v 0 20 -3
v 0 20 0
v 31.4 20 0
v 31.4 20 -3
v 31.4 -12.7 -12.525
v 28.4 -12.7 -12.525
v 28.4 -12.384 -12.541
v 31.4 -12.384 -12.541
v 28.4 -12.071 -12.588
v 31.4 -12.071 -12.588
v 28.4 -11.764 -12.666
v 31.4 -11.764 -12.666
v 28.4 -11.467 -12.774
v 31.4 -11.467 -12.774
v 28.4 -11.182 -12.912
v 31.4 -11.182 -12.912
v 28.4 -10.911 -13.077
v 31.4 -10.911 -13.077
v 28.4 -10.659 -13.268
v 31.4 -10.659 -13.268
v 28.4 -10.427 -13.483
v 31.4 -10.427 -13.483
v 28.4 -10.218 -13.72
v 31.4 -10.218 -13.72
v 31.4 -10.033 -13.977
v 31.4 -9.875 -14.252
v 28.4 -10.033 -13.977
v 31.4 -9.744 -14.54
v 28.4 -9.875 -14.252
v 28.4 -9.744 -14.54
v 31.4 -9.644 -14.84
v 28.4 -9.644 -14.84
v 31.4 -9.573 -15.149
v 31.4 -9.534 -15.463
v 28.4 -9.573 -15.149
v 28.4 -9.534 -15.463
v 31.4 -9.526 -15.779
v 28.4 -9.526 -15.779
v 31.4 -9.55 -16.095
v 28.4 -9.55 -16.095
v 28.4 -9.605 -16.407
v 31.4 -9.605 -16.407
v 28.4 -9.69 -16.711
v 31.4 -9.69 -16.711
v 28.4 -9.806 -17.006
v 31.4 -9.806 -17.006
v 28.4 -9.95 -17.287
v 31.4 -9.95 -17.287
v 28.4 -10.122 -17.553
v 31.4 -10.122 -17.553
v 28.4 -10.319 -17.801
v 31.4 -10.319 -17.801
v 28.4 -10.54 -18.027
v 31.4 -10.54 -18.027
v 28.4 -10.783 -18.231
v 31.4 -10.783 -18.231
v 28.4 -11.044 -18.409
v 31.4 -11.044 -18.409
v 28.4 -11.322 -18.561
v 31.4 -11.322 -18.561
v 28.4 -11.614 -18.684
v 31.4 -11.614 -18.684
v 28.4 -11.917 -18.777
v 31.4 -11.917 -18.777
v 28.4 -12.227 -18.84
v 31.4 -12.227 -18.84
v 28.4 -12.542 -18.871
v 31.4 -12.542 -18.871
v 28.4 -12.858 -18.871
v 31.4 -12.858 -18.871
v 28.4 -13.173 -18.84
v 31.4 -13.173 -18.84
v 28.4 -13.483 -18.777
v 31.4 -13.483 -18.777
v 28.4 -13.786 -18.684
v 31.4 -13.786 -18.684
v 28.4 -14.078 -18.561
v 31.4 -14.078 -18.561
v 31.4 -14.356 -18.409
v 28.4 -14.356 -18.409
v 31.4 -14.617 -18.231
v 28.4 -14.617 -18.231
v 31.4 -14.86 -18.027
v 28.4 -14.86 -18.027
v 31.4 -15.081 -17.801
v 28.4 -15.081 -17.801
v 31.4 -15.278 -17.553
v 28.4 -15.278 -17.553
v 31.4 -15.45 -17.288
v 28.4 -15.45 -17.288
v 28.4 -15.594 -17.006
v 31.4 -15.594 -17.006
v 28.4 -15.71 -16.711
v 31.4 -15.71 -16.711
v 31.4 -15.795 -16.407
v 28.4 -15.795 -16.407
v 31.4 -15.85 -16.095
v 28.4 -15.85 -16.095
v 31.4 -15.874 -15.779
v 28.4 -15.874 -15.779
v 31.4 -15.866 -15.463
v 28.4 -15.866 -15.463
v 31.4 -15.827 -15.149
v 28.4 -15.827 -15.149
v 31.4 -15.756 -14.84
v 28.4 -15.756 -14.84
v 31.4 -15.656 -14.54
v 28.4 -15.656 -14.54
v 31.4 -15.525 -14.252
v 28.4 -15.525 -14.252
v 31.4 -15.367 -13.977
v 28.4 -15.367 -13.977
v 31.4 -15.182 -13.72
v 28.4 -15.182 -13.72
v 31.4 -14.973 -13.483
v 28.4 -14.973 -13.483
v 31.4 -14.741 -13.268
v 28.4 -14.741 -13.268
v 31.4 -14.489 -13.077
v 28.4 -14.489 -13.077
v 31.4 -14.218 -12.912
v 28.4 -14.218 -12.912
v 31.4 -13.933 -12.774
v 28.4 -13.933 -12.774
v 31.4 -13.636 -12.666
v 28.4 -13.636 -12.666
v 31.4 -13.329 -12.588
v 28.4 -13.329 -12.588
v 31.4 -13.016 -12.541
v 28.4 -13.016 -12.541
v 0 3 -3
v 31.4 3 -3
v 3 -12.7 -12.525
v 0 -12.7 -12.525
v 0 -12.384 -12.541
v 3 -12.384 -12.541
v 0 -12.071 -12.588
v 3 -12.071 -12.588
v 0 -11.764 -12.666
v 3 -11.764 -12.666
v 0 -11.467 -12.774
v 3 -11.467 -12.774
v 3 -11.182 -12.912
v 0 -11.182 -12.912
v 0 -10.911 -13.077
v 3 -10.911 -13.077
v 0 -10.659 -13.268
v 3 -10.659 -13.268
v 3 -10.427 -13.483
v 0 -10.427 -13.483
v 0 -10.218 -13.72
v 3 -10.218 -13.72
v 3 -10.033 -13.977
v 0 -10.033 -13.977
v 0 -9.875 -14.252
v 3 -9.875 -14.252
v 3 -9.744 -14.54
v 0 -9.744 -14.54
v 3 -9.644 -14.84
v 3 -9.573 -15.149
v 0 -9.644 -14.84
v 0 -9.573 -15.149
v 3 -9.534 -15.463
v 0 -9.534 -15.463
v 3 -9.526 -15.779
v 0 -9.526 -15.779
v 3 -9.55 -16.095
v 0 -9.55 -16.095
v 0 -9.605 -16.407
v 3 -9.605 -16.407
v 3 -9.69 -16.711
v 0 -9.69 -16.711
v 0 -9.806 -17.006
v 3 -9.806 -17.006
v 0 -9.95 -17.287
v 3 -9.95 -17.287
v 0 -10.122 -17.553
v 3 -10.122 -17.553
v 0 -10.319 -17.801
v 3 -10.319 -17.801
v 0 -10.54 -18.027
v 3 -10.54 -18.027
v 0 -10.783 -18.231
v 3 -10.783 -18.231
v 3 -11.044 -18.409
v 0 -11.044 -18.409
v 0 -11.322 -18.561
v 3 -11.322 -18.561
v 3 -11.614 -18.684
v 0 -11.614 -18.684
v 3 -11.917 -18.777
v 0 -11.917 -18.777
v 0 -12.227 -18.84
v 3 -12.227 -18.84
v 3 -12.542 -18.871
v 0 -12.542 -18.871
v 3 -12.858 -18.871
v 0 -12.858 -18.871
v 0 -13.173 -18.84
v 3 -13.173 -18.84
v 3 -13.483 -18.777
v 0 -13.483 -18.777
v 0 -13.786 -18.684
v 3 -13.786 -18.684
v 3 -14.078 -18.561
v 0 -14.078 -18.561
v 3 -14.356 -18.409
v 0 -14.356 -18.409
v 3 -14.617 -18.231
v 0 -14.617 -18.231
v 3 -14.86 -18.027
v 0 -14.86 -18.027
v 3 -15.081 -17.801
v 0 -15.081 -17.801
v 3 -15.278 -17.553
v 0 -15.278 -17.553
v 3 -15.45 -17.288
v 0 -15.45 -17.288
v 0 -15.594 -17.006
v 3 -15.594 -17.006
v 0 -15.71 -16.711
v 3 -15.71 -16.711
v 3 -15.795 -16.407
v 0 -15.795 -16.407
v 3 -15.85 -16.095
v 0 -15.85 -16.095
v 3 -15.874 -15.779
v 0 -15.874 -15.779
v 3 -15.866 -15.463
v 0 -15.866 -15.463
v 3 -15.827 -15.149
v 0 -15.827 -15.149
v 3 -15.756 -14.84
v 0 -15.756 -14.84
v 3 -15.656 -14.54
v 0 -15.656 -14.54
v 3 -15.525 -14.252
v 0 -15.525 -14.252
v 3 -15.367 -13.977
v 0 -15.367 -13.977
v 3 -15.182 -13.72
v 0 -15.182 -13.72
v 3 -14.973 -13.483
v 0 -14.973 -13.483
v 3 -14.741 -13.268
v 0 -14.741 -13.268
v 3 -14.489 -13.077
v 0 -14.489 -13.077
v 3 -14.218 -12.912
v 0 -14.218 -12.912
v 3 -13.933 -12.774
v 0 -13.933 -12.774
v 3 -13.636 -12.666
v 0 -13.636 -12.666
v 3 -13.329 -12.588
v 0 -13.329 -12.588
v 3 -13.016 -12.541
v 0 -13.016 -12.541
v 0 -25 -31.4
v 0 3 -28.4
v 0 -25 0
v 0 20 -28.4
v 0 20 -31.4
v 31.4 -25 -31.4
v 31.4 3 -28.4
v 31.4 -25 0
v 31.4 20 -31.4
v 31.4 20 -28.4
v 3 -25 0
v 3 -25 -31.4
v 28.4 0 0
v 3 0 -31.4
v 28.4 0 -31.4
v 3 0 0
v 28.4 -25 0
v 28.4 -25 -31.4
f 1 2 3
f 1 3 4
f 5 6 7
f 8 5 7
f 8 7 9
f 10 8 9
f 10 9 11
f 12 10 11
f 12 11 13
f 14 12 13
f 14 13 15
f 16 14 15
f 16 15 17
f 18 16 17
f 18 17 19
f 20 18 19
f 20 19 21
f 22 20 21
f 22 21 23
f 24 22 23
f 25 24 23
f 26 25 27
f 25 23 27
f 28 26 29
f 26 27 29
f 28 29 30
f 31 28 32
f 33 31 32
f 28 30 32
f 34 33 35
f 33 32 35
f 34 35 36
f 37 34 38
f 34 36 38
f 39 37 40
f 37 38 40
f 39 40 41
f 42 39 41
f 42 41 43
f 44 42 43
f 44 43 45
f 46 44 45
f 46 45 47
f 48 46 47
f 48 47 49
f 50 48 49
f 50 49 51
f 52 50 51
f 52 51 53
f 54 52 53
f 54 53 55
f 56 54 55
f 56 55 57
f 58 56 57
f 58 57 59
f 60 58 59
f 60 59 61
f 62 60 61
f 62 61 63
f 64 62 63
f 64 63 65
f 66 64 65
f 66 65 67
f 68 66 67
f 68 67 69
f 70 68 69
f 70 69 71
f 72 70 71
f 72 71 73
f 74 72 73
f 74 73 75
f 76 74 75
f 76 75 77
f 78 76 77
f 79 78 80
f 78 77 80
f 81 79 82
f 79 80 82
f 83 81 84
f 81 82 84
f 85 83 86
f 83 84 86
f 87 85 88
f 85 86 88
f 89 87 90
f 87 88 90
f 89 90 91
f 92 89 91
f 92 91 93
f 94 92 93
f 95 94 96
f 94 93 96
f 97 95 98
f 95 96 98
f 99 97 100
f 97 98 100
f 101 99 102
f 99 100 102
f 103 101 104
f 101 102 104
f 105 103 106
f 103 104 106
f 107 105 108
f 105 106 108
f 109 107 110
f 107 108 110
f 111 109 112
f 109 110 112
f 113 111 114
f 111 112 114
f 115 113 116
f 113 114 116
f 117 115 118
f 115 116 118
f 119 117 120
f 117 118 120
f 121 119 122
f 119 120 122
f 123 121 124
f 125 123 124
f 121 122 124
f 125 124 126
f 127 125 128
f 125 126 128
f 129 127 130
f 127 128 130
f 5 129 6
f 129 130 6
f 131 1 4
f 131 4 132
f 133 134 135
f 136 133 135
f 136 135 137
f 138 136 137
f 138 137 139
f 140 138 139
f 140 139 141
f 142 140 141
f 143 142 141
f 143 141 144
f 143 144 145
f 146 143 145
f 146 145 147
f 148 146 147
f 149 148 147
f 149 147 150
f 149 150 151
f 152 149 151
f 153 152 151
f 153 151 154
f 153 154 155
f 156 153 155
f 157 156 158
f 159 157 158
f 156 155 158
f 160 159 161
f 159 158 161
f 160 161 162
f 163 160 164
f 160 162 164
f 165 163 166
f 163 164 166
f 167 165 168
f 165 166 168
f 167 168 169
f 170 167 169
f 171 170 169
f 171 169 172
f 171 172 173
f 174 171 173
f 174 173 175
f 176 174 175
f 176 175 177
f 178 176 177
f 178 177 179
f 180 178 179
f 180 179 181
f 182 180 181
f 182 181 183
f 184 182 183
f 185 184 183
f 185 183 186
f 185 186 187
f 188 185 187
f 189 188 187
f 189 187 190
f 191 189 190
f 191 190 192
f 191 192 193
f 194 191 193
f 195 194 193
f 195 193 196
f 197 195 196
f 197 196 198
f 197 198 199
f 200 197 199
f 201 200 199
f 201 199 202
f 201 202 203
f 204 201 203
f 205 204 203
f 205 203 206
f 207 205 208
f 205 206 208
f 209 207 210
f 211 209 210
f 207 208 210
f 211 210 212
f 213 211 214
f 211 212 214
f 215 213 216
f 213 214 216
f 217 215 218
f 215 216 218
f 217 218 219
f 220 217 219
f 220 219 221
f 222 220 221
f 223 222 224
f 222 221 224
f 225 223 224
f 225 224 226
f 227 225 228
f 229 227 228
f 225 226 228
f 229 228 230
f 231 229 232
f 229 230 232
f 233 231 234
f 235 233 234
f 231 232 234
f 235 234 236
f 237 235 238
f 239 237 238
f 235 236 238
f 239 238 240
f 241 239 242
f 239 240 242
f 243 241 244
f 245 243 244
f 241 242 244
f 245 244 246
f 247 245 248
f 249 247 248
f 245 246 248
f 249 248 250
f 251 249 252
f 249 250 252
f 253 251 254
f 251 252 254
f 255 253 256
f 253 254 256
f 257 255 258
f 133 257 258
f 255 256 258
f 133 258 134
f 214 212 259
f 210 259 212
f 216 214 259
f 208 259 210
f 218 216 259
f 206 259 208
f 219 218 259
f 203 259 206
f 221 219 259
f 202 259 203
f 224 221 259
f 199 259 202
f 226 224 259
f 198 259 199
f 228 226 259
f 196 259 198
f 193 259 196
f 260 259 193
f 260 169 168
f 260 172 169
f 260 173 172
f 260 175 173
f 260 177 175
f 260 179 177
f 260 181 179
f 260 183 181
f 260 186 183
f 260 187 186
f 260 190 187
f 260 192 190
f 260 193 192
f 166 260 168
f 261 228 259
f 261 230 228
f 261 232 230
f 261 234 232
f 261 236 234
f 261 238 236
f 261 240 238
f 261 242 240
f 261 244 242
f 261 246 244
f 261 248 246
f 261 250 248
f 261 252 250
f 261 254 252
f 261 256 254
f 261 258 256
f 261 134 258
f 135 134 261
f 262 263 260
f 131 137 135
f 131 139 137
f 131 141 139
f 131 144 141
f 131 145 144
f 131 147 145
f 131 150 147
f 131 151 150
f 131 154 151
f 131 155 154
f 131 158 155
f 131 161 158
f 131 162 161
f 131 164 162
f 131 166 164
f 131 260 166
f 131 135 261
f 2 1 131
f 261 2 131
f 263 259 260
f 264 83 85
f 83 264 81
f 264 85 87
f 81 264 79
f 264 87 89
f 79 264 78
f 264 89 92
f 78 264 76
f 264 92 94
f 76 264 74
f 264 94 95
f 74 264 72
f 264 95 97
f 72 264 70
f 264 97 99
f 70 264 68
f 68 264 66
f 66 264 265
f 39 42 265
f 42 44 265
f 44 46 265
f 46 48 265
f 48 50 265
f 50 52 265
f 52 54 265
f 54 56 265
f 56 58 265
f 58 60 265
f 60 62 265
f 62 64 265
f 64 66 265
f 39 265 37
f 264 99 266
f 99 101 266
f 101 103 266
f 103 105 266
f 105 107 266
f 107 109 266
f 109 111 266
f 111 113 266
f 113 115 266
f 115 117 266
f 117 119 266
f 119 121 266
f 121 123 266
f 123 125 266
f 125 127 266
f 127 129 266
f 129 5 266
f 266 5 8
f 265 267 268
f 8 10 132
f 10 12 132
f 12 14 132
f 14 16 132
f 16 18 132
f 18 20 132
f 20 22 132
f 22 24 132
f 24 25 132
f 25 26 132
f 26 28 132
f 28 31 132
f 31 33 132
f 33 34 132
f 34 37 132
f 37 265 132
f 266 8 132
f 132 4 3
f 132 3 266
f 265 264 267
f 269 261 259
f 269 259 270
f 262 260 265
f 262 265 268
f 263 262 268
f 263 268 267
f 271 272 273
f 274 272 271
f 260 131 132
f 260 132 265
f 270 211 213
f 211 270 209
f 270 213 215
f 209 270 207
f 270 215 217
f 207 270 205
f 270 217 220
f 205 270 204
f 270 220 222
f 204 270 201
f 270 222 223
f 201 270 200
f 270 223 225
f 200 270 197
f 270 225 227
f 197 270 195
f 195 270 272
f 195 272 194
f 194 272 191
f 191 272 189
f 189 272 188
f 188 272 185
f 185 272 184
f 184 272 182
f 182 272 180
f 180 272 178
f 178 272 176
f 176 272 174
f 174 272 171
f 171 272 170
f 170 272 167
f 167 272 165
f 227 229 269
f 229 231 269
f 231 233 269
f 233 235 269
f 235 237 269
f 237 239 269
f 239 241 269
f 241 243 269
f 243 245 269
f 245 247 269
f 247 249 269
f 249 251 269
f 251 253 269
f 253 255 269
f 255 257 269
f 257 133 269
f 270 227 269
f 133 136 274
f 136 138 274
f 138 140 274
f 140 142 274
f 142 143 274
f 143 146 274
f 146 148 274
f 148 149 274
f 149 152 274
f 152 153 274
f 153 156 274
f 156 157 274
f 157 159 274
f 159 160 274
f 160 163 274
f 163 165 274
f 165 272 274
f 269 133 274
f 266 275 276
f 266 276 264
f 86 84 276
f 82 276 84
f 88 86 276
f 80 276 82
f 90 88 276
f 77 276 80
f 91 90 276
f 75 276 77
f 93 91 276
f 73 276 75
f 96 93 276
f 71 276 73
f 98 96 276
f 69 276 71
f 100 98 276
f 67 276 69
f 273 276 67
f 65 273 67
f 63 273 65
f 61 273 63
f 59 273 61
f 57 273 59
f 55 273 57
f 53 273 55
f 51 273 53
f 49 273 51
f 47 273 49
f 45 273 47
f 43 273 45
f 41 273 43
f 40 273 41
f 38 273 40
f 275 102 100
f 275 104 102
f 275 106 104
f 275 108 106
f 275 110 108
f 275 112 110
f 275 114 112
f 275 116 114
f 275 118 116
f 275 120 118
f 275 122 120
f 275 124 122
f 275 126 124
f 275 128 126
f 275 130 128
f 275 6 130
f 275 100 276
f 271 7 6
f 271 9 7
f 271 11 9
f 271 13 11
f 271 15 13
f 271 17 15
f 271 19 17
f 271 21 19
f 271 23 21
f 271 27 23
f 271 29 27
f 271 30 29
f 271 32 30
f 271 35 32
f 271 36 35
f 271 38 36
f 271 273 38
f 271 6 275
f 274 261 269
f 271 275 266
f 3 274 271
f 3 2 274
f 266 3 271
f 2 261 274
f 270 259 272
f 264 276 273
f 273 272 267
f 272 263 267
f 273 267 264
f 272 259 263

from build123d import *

# Parameters (mm, degrees)
BOSS_EXTRUDE1_DEPTH         = 31.4
SKETCH2_W                   = 3
SKETCH2_H                   = 31.4
BOSS_EXTRUDE2_DEPTH         = 25
F_1_4_0_25_DIAMETER_HOLE1_D = 6.35


with BuildPart() as part:
    # Sketch1 → Boss-Extrude1 (new body)
    with BuildSketch(Plane(origin=(0, 0, 0), x_dir=(0, 0, -1), z_dir=(1, 0, 0))):
        Polygon((0, 0), (0, 20), (3, 20), (3, 3), (28.4, 3), (28.4, 20), (31.4, 20), (31.4, 0), align=None)
    extrude(amount=BOSS_EXTRUDE1_DEPTH)

    # Sketch2 → Boss-Extrude2 (add)
    with BuildSketch(Plane.XZ):
        with Locations((29.9, -15.7)):
            Rectangle(SKETCH2_W, SKETCH2_H)
        with Locations((1.5, -15.7)):
            Rectangle(SKETCH2_W, SKETCH2_H)
    extrude(amount=BOSS_EXTRUDE2_DEPTH)

    # 1/4 (0.25) Diameter Hole1 (through all)
    with Locations(Plane(origin=(31.4, 0, 0), x_dir=(0, 0, -1), z_dir=(1, 0, 0))):
        with Locations((15.7, -12.7)):
            Hole(F_1_4_0_25_DIAMETER_HOLE1_D / 2)


solid = part.part
